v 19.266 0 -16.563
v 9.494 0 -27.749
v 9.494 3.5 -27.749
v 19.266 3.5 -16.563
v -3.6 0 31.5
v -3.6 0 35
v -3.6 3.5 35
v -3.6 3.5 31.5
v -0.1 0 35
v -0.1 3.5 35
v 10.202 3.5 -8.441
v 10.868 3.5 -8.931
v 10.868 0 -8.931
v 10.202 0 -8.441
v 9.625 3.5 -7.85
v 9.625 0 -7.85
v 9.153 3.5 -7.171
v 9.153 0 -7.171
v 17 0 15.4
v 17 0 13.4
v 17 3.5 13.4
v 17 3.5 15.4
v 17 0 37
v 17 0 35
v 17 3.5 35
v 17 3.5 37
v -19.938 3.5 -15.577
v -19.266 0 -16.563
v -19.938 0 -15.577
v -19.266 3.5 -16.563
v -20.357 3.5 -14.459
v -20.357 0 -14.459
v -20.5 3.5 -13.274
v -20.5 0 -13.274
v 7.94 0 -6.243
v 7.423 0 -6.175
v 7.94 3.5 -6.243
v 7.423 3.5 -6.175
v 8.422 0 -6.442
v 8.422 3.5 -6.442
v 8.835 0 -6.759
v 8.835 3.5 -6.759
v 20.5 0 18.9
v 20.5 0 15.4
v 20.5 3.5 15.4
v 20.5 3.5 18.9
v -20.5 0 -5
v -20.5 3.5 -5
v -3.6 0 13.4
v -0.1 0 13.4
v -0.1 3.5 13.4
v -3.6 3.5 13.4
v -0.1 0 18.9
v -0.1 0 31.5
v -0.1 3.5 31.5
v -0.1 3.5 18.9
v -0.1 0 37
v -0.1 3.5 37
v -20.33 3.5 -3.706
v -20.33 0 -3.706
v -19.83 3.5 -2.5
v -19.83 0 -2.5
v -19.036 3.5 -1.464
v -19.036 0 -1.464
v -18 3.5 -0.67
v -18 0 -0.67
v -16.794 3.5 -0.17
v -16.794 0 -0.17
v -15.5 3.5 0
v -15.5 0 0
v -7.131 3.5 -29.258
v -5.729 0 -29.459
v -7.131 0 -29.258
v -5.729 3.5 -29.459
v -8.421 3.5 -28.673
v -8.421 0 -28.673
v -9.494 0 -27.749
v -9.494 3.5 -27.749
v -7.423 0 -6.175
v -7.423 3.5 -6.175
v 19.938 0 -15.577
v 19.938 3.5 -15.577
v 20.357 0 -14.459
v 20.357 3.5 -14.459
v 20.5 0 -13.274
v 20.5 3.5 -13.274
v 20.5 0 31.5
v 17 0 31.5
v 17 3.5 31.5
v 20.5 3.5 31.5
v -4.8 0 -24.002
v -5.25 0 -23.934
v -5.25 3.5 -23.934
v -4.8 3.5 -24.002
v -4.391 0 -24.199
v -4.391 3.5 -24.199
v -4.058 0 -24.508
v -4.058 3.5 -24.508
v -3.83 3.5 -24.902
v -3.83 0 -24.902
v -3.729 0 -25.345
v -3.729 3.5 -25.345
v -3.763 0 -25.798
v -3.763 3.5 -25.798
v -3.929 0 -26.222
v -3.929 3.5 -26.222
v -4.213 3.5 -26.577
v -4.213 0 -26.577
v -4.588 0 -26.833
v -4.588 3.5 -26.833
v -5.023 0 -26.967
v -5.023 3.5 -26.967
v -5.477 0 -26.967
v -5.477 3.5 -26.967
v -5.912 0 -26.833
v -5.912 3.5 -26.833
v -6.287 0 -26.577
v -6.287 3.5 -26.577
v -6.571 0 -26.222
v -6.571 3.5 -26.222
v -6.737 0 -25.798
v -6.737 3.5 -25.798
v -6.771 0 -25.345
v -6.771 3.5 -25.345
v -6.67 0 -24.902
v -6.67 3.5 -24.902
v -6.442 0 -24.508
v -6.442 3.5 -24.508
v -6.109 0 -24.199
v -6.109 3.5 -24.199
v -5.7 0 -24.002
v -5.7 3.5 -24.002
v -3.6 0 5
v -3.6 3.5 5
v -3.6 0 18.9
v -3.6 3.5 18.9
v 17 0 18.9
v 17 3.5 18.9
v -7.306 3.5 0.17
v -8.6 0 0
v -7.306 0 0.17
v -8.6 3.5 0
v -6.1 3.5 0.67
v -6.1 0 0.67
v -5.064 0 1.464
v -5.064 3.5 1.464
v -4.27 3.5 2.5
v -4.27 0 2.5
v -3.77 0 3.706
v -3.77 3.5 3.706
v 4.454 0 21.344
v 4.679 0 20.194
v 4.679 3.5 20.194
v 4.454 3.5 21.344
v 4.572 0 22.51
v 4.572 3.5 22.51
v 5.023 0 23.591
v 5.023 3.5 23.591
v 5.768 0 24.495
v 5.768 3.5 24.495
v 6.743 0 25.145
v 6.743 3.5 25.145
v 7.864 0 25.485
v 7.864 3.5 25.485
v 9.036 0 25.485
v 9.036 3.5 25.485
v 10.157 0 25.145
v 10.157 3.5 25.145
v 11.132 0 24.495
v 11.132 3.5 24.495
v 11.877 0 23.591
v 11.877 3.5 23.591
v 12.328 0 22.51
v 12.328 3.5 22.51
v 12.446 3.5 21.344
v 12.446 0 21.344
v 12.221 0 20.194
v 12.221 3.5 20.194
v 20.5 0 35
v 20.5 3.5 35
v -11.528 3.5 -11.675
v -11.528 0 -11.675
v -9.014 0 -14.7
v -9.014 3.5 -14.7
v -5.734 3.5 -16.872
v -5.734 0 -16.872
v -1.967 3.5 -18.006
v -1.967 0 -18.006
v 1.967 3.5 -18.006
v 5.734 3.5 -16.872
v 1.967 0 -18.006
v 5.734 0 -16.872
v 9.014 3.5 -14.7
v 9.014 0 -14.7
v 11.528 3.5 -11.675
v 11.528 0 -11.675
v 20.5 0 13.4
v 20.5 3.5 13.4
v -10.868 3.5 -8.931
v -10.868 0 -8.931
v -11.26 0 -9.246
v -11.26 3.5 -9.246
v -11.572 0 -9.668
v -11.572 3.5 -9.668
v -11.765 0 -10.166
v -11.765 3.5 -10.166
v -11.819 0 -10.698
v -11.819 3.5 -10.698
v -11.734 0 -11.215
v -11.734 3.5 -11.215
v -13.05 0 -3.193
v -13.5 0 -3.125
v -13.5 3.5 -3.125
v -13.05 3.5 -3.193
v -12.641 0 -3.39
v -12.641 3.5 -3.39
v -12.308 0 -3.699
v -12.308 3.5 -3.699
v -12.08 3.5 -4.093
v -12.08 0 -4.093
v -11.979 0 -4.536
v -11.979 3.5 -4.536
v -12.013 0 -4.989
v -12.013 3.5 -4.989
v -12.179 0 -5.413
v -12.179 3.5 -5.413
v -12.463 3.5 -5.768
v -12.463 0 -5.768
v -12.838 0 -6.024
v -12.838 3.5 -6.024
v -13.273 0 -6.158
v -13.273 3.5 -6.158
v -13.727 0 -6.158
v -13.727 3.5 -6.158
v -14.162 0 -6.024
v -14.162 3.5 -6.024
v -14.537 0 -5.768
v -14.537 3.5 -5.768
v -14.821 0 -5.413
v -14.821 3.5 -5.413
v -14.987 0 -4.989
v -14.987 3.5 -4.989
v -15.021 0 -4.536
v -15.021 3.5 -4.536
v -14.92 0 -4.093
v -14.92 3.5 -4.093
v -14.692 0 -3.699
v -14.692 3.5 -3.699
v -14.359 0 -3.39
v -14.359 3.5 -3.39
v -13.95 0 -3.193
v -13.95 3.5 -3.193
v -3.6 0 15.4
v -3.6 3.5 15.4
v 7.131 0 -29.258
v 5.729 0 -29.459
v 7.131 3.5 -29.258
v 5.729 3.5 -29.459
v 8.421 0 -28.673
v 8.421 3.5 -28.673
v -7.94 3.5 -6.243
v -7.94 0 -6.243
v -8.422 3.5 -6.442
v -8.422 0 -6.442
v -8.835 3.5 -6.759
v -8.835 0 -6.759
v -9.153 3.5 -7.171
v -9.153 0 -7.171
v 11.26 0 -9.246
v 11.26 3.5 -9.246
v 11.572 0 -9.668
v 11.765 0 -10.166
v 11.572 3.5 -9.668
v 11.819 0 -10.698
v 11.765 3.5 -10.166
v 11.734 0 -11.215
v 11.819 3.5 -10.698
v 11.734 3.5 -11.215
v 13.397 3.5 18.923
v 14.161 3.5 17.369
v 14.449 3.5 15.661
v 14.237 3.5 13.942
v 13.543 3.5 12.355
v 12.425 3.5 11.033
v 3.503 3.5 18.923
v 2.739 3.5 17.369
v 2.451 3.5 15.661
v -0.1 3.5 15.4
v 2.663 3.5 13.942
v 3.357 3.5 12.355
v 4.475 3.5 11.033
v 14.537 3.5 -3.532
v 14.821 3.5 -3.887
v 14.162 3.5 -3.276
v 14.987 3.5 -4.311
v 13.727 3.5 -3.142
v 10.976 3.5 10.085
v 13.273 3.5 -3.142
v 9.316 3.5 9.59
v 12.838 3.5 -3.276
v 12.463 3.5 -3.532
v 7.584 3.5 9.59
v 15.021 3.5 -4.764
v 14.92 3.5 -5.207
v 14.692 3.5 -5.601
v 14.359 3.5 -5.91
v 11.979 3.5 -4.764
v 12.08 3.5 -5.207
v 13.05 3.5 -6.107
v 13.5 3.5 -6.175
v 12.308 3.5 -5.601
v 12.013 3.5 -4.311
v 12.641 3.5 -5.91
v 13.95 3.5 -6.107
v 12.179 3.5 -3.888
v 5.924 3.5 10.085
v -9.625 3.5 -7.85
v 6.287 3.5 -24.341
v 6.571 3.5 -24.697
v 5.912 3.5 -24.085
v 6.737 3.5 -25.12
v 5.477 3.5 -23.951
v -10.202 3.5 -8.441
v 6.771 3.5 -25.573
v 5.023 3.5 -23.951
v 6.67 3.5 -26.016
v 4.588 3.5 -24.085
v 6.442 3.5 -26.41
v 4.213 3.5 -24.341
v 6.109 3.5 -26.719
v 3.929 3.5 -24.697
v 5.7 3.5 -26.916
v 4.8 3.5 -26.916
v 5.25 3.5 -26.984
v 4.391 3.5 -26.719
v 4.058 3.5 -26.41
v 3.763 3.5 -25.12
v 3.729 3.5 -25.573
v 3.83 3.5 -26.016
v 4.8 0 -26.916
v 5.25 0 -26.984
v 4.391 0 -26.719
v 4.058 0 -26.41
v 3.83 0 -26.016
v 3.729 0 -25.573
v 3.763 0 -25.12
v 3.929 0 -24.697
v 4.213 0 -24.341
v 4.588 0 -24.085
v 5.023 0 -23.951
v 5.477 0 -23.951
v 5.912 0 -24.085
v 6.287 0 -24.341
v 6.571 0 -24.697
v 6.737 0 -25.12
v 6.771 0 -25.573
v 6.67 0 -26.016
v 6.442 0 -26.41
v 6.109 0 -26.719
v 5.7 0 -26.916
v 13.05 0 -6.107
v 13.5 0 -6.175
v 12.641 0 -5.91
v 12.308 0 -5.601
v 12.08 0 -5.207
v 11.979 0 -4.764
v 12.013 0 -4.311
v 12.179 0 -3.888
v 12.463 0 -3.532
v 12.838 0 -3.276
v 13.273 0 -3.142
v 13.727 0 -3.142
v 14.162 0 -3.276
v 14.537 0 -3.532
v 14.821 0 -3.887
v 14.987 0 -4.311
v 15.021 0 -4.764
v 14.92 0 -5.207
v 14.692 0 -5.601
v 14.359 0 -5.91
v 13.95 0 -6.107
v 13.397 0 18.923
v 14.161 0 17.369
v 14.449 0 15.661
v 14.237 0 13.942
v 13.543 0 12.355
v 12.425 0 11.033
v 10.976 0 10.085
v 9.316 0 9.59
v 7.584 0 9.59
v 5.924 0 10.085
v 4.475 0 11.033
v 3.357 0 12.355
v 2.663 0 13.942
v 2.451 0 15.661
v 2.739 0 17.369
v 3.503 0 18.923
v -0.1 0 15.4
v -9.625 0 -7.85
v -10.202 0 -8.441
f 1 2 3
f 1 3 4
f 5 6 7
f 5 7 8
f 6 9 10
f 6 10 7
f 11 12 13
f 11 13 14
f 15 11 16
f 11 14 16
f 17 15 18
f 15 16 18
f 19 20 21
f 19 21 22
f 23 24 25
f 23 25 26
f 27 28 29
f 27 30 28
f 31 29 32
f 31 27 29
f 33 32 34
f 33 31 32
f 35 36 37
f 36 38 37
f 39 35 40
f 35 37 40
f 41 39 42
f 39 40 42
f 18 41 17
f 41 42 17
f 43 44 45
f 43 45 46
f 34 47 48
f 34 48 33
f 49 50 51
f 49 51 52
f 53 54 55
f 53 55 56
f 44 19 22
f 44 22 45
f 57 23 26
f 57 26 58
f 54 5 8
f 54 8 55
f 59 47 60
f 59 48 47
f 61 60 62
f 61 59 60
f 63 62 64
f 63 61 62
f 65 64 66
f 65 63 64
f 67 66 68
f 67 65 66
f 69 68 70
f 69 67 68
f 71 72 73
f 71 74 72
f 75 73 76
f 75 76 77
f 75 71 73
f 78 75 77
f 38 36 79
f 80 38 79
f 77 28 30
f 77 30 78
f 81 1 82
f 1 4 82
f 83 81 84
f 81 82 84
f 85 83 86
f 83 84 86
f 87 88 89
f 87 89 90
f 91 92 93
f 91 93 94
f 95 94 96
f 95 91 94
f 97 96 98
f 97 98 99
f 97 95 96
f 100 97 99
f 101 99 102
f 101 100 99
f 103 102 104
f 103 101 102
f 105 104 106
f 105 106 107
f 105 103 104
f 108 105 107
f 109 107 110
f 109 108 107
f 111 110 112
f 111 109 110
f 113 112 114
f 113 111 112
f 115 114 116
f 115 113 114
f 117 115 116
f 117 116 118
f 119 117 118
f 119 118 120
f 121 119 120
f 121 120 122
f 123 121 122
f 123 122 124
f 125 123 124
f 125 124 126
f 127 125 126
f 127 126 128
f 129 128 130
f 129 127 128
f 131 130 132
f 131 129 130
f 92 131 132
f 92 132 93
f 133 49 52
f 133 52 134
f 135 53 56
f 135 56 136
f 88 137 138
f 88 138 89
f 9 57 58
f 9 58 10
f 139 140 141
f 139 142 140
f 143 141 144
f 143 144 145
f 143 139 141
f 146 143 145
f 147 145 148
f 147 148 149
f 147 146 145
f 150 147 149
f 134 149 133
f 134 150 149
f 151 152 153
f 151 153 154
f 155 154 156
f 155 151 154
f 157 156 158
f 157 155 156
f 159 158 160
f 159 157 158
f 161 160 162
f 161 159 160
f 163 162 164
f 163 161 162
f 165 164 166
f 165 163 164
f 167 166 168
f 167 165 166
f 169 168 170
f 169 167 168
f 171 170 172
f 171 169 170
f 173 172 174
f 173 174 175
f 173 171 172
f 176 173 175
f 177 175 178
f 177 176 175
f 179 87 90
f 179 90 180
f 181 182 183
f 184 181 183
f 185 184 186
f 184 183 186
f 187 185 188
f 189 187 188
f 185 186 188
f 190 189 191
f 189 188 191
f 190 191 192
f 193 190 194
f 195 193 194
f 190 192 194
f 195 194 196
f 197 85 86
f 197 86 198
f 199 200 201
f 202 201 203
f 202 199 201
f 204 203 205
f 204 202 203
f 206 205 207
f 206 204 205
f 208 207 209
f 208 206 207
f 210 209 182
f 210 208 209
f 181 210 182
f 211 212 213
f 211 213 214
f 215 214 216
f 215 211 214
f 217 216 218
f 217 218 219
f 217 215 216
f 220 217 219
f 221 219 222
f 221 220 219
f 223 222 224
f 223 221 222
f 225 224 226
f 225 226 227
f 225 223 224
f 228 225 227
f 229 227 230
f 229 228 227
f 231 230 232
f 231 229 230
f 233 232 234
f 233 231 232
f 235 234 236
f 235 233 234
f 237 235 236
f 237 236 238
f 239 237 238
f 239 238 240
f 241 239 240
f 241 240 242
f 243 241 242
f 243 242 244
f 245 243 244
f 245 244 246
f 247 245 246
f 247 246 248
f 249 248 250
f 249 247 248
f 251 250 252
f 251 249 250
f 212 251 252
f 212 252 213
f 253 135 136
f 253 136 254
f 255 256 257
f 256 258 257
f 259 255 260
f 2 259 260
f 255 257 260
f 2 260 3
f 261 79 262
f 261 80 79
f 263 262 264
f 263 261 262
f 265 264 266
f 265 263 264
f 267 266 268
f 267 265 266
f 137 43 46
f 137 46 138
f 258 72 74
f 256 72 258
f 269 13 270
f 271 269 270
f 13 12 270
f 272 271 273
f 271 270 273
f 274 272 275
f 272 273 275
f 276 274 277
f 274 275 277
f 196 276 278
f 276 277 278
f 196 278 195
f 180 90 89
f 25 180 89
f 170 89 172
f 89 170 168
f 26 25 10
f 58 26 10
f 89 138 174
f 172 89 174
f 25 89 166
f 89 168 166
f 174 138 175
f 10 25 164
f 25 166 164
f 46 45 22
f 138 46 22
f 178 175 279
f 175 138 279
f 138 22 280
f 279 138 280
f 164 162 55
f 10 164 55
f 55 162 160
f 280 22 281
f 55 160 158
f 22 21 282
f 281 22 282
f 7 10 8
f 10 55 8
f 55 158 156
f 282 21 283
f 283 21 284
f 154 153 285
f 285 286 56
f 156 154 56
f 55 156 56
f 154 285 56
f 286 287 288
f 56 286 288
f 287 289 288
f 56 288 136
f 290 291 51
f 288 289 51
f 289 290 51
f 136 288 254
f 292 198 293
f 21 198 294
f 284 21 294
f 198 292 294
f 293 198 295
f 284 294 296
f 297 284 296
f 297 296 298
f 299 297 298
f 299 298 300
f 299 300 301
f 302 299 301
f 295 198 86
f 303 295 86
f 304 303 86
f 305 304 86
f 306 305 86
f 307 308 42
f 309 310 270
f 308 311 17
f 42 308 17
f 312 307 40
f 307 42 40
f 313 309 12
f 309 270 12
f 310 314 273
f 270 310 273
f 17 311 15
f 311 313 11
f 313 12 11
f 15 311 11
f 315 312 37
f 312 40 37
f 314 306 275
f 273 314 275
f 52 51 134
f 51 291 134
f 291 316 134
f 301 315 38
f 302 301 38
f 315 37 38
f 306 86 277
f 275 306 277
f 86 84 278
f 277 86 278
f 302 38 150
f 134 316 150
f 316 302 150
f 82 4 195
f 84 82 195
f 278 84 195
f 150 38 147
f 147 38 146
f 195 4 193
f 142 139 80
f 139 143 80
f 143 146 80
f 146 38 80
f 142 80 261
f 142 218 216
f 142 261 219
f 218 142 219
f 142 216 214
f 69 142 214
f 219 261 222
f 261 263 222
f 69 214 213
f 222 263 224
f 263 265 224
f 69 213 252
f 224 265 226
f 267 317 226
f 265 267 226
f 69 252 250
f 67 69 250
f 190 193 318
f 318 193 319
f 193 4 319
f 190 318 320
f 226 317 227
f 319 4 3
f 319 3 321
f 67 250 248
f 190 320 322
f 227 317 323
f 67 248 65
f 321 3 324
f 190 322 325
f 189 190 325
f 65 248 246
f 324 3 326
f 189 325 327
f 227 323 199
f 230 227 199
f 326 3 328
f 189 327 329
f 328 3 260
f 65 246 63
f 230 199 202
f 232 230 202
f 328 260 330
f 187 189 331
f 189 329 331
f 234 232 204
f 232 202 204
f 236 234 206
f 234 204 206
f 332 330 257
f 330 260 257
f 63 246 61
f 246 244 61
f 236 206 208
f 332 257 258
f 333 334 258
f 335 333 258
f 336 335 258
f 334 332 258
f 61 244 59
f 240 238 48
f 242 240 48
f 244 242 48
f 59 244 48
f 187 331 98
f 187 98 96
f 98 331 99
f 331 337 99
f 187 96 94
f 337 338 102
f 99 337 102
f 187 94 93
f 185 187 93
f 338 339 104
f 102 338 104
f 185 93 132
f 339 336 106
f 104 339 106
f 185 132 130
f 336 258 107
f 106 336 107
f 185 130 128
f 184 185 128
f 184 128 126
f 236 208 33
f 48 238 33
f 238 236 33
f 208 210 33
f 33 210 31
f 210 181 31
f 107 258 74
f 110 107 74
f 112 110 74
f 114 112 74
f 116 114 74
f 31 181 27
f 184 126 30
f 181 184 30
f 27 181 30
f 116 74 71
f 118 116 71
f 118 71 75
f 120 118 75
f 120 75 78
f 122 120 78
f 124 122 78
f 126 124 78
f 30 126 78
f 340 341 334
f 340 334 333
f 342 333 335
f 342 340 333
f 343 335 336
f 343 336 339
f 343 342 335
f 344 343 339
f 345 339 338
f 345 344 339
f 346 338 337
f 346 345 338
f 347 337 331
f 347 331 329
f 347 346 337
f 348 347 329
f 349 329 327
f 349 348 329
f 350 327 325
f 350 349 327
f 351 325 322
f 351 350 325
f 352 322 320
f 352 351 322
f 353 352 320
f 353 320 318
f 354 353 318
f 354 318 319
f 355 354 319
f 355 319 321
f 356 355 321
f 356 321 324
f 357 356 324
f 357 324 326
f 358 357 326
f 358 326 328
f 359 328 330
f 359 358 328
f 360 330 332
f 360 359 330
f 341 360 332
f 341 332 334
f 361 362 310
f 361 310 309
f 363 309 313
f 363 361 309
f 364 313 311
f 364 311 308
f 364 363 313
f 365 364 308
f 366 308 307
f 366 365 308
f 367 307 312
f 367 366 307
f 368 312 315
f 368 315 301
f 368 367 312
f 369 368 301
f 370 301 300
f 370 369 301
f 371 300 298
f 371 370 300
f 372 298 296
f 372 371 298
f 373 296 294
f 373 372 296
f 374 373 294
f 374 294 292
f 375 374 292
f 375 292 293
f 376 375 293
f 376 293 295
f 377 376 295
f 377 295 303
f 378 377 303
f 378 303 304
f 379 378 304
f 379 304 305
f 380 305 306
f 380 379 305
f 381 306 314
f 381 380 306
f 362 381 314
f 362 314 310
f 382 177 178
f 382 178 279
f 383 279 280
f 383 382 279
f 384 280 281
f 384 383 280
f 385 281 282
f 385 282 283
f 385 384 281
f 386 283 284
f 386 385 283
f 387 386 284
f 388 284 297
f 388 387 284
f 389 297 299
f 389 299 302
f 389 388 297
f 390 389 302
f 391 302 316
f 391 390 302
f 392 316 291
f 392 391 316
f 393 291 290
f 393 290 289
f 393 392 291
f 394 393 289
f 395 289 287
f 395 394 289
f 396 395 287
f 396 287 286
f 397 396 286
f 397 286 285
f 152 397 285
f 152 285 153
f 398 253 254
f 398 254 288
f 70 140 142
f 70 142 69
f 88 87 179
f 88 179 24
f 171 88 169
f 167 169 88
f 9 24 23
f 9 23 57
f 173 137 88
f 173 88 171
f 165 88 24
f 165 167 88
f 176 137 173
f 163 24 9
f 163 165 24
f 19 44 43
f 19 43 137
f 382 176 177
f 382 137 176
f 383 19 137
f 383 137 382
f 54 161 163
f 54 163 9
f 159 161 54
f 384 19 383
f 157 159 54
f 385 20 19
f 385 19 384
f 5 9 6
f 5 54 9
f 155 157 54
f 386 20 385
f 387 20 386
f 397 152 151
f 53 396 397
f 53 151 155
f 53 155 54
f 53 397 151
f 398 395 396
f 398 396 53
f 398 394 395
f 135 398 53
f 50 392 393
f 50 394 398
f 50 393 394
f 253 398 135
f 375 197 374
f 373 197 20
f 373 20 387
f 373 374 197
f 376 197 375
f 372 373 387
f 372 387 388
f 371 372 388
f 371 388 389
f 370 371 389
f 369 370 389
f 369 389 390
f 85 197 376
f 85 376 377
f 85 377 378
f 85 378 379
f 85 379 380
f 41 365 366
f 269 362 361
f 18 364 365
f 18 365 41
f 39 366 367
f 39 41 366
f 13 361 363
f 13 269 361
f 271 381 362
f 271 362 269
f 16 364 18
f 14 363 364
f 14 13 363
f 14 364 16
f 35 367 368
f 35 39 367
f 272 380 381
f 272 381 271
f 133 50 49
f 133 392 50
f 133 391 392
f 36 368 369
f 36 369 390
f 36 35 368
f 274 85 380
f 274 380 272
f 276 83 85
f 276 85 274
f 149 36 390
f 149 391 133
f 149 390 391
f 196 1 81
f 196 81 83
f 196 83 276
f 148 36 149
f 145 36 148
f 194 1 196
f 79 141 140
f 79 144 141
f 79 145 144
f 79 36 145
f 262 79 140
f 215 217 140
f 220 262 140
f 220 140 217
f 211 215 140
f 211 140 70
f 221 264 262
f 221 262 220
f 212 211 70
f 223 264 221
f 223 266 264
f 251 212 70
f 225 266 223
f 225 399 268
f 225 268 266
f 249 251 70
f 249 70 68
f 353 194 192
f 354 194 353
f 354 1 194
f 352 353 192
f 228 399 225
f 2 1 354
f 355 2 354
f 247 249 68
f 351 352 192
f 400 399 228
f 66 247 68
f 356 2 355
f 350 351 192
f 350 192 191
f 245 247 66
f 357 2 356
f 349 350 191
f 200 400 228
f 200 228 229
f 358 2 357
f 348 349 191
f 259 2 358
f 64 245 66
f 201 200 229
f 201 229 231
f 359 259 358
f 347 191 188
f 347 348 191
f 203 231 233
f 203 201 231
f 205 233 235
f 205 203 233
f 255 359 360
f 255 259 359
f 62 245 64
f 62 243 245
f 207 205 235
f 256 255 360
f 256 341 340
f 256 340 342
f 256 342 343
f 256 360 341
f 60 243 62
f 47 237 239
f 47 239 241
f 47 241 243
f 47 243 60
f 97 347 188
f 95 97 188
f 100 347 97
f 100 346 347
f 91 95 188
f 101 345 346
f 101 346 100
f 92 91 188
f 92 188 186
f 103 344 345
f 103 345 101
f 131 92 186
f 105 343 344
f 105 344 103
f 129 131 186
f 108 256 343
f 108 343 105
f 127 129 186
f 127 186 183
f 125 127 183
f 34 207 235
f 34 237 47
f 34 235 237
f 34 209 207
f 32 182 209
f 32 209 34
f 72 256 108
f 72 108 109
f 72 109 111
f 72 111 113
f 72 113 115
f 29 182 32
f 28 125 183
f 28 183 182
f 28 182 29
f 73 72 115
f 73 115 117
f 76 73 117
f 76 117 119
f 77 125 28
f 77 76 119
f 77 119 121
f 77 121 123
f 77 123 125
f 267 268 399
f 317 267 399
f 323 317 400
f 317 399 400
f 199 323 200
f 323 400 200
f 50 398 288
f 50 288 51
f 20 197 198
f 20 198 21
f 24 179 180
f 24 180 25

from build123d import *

# Parameters (mm, degrees)
SKETCH2_R           = 1.525
BOSS_EXTRUDE1_DEPTH = 3.5
FILLET1_R           = 5
FILLET2_R           = 2


with BuildPart() as part:
    # Sketch2 → Boss-Extrude1 (new body)
    with BuildSketch(Plane(origin=(0, 0, 0), x_dir=(1, 0, 0), z_dir=(0, 1, 0))):
        Polygon((-8, 29.459088021), (8, 29.459088021), (20.5, 15.15), (20.5, -13.4), (17, -13.4), (17, -15.4), (20.5, -15.4), (20.5, -18.9), (17, -18.9), (17, -31.5), (20.5, -31.5), (20.5, -35), (17, -35), (17, -37), (-0.1, -37), (-0.1, -35), (-3.6, -35), (-3.6, -31.5), (-0.1, -31.5), (-0.1, -18.9), (-3.6, -18.9), (-3.6, -15.4), (-0.1, -15.4), (-0.1, -13.4), (-3.6, -13.4), (-3.6, 0), (-20.5, 0), (-20.5, 15.15), align=None)
        with Locations(Location((-5.25, 25.459088021, 0), (0, 0, 270))):
            Circle(SKETCH2_R, mode=Mode.SUBTRACT)
        with Locations(Location((-13.5, 4.65, 0), (0, 0, 270))):
            Circle(SKETCH2_R, mode=Mode.SUBTRACT)
        with Locations(Location((13.5, 4.65, 0), (0, 0, 90))):
            Circle(SKETCH2_R, mode=Mode.SUBTRACT)
        with Locations(Location((5.25, 25.459088021, 0), (0, 0, 90))):
            Circle(SKETCH2_R, mode=Mode.SUBTRACT)
        with BuildLine():
            Line((8.711994152, 6.175), (-8.711994152, 6.175))
            ThreePointArc((-8.711994152, 6.175), (-10.168396205, 8.411786963), (-12.564791667, 9.587206738))
            ThreePointArc((-12.564791667, 9.587206738), (0, 18.15), (12.564791667, 9.587206738))
            ThreePointArc((12.564791667, 9.587206738), (10.168396205, 8.411786963), (8.711994152, 6.175))
        make_face(mode=Mode.SUBTRACT)
        with BuildLine():
            ThreePointArc((4.678763834, -20.194315192), (8.45, -25.527648525), (12.221236166, -20.194315192))
            ThreePointArc((12.221236166, -20.194315192), (8.45, -9.527648525), (4.678763834, -20.194315192))
        make_face(mode=Mode.SUBTRACT)
    extrude(amount=BOSS_EXTRUDE1_DEPTH)

    # Fillet1
    fillet1_edges = [part.edges().sort_by_distance(p)[0] for p in [
        (20.5, 1.75, -15.15),
        (-3.6, 1.75, 0),
        (-20.5, 1.75, 0),
        (-20.5, 1.75, -15.15),
        (-8, 1.75, -29.459088021),
        (8, 1.75, -29.459088021),
    ]]
    fillet(fillet1_edges, radius=FILLET1_R)

    # Fillet2
    fillet2_edges = [part.edges().sort_by_distance(p)[0] for p in [
        (-12.564791667, 1.75, -9.587206738),
        (-8.711994152, 1.75, -6.175),
        (8.711994152, 1.75, -6.175),
        (12.564791667, 1.75, -9.587206738),
    ]]
    fillet(fillet2_edges, radius=FILLET2_R)


solid = part.part
